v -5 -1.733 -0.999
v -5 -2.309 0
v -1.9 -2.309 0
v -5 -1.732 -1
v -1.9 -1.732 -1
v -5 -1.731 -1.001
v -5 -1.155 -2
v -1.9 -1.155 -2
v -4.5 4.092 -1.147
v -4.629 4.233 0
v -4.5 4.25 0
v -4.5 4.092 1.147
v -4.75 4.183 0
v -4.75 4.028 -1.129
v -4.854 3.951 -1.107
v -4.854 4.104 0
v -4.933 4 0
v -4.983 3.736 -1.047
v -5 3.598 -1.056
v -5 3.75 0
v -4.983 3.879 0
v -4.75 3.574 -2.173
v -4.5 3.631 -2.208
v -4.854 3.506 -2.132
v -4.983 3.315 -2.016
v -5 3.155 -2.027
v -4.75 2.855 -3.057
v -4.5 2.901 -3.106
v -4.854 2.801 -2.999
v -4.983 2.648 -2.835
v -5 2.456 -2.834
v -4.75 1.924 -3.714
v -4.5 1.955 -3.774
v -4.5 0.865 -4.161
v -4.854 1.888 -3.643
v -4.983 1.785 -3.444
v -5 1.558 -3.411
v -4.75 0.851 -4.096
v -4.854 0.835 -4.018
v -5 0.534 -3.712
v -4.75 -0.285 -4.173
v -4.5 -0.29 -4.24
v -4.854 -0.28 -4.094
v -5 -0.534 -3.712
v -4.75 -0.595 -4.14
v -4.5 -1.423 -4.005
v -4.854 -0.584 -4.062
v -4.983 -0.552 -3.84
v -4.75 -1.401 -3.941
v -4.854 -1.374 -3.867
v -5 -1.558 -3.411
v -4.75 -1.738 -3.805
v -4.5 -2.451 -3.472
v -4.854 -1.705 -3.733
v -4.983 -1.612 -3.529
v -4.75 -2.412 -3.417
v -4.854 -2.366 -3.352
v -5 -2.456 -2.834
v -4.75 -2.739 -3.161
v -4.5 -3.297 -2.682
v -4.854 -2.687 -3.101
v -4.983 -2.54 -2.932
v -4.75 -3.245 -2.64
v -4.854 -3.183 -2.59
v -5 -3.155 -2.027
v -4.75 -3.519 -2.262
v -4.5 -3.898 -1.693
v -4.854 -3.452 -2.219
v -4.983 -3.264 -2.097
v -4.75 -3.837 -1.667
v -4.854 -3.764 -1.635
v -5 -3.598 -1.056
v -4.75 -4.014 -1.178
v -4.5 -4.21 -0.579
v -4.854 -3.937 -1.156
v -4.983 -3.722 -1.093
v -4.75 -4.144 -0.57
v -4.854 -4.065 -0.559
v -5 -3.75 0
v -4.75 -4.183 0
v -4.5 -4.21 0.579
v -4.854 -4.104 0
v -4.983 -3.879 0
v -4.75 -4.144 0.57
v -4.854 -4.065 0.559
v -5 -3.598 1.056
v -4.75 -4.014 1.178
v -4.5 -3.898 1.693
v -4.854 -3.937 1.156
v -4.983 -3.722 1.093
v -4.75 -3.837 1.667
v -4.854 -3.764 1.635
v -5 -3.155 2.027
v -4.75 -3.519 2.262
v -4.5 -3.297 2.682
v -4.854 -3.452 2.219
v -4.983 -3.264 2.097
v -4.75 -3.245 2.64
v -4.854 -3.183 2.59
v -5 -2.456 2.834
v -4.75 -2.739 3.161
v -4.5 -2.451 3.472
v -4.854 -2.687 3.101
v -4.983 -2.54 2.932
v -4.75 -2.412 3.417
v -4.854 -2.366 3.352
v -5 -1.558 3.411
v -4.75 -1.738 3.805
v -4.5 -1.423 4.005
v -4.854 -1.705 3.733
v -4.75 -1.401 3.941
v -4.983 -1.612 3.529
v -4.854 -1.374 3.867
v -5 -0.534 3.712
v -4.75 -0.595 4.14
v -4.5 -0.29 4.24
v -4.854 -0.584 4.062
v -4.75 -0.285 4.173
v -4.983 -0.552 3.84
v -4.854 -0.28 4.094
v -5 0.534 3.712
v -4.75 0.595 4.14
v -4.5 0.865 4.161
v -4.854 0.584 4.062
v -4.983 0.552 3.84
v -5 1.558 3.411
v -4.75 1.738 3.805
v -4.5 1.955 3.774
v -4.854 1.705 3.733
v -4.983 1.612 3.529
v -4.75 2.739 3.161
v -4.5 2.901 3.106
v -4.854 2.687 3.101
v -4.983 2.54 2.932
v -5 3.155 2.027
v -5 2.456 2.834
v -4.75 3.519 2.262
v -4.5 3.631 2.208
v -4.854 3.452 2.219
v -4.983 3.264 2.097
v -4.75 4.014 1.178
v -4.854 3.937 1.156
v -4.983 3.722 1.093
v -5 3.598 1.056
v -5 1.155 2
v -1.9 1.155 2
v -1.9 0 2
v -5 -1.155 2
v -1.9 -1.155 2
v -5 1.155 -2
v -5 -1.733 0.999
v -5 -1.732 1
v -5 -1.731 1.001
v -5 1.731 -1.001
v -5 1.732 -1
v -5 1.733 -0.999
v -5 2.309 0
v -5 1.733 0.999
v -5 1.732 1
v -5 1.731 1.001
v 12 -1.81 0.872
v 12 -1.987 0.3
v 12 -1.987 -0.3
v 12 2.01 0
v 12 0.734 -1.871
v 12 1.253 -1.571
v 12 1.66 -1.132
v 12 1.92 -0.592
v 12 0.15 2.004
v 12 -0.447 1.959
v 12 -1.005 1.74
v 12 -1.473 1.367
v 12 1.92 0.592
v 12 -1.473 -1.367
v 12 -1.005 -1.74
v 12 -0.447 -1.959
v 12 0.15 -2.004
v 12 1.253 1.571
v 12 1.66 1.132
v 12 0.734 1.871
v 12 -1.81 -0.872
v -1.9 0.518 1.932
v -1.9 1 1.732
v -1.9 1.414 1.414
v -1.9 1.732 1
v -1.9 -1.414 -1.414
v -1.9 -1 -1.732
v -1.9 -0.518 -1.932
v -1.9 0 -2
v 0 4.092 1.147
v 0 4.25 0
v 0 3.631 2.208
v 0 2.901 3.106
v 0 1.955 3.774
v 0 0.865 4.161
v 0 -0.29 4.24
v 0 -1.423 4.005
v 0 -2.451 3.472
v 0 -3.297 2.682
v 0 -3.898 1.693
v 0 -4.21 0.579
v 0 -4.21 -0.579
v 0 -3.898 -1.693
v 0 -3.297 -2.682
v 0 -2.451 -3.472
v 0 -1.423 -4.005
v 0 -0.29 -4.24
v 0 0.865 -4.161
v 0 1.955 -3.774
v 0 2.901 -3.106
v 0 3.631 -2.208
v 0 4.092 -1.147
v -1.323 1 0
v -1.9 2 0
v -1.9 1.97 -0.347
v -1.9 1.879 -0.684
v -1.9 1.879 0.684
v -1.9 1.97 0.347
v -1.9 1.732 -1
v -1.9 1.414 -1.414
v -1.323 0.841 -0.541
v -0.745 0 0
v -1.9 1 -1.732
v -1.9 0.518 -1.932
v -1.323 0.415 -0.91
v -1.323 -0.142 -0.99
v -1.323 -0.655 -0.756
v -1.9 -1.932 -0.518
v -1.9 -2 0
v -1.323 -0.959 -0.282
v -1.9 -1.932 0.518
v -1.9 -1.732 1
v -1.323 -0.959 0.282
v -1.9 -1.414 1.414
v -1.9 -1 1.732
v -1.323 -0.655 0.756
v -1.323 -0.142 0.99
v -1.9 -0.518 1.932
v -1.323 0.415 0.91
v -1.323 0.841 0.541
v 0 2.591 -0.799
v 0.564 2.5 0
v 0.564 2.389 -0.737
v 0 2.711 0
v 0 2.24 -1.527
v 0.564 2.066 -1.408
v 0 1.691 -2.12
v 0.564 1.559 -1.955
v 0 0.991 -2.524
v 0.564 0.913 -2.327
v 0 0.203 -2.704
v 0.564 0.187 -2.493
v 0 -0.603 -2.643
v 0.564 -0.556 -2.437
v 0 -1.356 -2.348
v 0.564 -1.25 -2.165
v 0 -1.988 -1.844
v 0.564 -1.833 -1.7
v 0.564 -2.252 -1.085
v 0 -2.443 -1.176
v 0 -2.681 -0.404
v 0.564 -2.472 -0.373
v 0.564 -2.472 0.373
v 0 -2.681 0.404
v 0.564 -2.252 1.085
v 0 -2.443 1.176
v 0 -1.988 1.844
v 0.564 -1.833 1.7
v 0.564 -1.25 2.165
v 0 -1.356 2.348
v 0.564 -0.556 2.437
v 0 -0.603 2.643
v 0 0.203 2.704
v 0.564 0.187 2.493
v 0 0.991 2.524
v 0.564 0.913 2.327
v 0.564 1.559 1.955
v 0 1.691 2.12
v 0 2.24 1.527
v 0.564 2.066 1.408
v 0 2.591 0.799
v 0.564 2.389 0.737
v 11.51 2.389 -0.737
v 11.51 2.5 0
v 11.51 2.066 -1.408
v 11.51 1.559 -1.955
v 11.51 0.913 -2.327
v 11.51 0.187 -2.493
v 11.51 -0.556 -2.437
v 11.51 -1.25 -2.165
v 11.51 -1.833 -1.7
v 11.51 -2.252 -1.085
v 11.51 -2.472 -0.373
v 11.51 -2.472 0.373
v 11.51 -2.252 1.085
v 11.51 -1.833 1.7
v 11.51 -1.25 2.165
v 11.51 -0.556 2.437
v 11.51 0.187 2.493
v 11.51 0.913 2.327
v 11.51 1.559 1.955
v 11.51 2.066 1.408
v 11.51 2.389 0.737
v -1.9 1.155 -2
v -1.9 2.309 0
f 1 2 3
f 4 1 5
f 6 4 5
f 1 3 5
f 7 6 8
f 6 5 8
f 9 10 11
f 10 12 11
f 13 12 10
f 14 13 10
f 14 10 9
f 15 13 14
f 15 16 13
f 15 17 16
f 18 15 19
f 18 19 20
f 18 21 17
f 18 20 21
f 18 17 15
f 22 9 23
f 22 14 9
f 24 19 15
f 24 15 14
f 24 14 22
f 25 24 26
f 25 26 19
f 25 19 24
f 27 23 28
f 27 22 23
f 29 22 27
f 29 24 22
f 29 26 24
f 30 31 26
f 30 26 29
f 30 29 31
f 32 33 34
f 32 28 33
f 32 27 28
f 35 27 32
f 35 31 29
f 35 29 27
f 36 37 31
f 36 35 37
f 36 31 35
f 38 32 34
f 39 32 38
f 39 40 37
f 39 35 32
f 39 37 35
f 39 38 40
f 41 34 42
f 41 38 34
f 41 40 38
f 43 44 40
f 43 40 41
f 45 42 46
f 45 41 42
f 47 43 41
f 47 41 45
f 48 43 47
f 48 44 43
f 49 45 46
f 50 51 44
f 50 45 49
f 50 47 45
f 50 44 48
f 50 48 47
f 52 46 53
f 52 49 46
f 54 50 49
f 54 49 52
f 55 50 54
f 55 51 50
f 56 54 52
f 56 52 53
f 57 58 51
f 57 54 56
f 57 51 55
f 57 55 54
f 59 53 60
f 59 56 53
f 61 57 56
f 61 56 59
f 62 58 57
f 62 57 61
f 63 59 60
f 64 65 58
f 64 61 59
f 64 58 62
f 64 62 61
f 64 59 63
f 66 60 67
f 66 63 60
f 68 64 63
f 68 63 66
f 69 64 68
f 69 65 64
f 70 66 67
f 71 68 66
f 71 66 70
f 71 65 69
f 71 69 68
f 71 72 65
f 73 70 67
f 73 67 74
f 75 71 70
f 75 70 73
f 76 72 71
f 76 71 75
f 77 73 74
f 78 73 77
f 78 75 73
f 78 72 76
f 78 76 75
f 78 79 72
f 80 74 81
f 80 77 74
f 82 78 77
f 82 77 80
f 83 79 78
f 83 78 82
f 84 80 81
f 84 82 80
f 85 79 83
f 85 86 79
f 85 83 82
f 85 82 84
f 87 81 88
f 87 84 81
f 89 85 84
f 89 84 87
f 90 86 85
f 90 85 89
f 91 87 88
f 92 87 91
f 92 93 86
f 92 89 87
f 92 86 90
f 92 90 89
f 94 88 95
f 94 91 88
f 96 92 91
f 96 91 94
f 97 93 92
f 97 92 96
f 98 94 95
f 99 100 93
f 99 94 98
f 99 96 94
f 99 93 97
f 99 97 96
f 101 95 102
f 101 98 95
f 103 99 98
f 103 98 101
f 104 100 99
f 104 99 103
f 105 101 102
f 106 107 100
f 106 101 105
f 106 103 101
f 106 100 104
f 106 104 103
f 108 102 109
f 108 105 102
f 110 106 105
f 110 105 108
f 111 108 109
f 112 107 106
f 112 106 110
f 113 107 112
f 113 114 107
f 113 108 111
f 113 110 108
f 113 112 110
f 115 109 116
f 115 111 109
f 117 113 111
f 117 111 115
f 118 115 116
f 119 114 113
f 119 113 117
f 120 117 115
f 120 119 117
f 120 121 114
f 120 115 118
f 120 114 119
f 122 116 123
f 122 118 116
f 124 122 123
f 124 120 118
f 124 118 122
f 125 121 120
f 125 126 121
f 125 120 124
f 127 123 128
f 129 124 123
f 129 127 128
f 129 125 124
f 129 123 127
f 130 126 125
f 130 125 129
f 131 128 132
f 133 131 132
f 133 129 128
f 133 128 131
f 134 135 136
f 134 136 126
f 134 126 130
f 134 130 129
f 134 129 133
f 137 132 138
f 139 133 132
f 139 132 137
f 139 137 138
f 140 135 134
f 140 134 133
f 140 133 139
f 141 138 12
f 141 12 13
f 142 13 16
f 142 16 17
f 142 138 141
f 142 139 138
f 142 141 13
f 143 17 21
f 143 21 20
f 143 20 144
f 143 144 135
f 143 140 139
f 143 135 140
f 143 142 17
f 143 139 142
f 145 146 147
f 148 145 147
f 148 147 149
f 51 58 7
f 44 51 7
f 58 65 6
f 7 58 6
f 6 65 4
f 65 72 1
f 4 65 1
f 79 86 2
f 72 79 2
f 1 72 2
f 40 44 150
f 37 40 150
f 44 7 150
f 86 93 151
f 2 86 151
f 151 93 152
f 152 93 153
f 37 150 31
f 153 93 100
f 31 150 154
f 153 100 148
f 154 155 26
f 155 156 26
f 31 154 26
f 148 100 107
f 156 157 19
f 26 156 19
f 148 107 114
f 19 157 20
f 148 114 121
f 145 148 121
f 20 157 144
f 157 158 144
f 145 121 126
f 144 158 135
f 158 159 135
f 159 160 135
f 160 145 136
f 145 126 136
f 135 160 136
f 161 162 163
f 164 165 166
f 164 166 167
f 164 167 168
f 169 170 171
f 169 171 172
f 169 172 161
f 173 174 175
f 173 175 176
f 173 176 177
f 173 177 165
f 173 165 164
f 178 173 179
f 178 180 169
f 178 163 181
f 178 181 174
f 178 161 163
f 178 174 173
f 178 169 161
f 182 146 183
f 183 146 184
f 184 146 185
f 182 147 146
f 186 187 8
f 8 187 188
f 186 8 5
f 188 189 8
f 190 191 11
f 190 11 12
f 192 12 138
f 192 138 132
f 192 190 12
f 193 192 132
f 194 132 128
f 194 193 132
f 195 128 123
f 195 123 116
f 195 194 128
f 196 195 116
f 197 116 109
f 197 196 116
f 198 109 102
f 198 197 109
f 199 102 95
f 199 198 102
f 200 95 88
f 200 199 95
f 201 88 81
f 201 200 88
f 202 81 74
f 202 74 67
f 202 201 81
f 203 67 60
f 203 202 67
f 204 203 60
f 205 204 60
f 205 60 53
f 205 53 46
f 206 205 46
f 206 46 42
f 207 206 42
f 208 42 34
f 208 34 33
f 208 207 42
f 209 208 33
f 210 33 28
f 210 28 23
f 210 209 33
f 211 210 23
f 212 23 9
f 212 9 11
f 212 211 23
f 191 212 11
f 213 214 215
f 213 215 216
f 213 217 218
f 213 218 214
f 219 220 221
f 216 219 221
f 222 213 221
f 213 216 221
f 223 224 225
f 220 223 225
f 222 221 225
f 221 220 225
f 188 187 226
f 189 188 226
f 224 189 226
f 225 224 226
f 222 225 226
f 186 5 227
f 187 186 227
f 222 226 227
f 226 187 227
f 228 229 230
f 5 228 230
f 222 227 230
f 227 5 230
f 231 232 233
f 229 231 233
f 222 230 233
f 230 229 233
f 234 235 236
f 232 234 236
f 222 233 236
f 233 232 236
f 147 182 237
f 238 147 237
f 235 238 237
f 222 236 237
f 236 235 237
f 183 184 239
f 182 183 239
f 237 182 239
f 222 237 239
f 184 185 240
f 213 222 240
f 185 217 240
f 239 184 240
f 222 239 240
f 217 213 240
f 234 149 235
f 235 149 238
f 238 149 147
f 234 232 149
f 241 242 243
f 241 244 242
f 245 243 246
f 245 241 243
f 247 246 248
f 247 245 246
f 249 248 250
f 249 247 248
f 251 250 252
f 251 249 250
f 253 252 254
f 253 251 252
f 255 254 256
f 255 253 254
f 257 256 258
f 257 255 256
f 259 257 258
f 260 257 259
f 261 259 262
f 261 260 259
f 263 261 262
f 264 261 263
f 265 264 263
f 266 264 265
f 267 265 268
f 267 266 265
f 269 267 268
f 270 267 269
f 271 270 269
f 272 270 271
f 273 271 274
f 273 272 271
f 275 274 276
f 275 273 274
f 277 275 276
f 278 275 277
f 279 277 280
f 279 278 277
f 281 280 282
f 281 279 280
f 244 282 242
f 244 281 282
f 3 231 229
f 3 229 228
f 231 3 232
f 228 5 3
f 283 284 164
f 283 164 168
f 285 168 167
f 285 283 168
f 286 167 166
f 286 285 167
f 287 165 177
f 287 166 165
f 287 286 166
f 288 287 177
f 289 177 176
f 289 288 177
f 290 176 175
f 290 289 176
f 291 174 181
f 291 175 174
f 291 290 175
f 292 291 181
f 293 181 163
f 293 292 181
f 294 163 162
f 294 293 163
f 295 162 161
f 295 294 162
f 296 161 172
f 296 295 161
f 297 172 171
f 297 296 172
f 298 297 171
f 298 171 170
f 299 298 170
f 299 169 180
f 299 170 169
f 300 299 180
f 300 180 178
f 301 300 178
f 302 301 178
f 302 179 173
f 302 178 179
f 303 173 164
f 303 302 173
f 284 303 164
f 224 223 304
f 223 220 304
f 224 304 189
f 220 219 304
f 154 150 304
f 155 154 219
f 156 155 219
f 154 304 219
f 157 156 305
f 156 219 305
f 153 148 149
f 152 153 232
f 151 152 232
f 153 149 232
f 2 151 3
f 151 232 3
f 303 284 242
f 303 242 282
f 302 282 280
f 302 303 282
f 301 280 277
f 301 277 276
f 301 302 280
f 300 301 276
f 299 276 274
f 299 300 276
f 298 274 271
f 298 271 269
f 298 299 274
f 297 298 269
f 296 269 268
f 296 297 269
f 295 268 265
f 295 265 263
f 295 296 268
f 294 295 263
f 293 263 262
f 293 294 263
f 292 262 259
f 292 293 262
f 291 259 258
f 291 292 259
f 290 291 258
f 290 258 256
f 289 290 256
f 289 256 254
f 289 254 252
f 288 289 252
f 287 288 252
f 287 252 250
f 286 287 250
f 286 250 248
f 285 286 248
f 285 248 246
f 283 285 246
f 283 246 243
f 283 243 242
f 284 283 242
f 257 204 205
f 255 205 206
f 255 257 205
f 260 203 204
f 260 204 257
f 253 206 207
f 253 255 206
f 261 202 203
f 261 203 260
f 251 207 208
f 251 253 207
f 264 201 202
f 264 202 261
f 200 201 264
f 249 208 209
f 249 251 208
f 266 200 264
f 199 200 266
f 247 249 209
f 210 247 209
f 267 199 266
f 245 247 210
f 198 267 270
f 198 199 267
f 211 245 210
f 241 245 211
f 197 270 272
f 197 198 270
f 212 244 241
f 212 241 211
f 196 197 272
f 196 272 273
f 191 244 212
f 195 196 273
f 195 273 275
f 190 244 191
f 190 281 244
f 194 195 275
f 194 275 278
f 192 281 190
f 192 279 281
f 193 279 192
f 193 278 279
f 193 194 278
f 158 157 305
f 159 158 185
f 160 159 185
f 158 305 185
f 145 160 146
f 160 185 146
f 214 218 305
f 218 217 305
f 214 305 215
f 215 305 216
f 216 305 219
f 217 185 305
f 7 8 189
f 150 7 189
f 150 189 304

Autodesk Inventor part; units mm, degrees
sketch "Skizze_2" plane through (0, 0, 0) normal (0, 0, 1) x (1, 0, 0)
  line L0 (12, 0) -> (-8, 0)
  line L1 (-0.7453, 0) -> (-1.9, 2)
  line L2 (-1.9, 2) -> (-5, 2)
  line L3 (-5, 2) -> (-5, 3.75)
  arc A0 (-4.5, 4.25) -> (-5, 3.75) centre (-4.5, 3.75) ccw
  line L4 (-4.5, 4.25) -> (0, 4.25)
  line L5 (0, 4.25) -> (0, 2.7114)
  line L6 (0, 2.7114) -> (0.5637, 2.5)
  line L7 (0.5637, 2.5) -> (11.5095, 2.5)
  line L8 (11.5095, 2.5) -> (12, 2.0095)
  line L9 (12, 2.0095) -> (12, 0)
  line L10 (12, 0) -> (-0.7453, 0)
revolve "Revolution1" add sketch "Skizze_2" angle 360 about axis through (12, 0, 0) along (1, 0, 0)
thread "Thread1" size "M5x0.8" class "6g" standard "ISO Metric profile" length 9.1095
sketch "Skizze_1" plane through (-1.9, 0, 0) normal (1, 0, 0) x (0, 0, -1)
  line L0 (-2, 1.1547) -> (-2, -1.1547)
  line L1 (-2, -1.1547) -> (0, -2.3094)
  line L2 (0, -2.3094) -> (2, -1.1547)
  line L3 (2, -1.1547) -> (2, 1.1547)
  line L4 (2, 1.1547) -> (0, 2.3094)
  line L5 (0, 2.3094) -> (-2, 1.1547)
extrude "Extrusion1" cut sketch "Skizze_1" against normal blind 5
ref_plane "IP1_XY" through (0, 0, 0) normal (1, 0, 0) x (0, 0, -1)
ref_plane "IP1_YZ" through (0, 0, 0) normal (0, 0, -1) x (0, 1, 0)
ref_plane "IP1_ZX" through (0, 0, 0) normal (0, 1, 0) x (1, 0, 0)
ref_plane "IP2_XY" through (-5, 0, 0) normal (1, 0, 0) x (0, 0, -1)
ref_plane "IP2_YZ" through (-5, 0, 0) normal (0, 0, -1) x (0, 1, 0)
ref_plane "IP2_ZX" through (-5, 0, 0) normal (0, 1, 0) x (1, 0, 0)
ref_plane "IP3_XY" through (12, 0, 0) normal (1, 0, 0) x (0, 0, -1)
ref_plane "IP3_YZ" through (12, 0, 0) normal (0, 0, -1) x (0, 1, 0)
ref_plane "IP3_ZX" through (12, 0, 0) normal (0, 1, 0) x (1, 0, 0)
ref_plane "IP4_XY" through (0, 0, 0) normal (1, 0, 0) x (0, 0, -1)
ref_plane "IP4_YZ" through (0, 0, 0) normal (0, 0, -1) x (0, 1, 0)
ref_plane "IP4_ZX" through (0, 0, 0) normal (0, 1, 0) x (1, 0, 0)
properties part number "Zylinderschraube ISO 4762 - screw - M5x12-screw"
